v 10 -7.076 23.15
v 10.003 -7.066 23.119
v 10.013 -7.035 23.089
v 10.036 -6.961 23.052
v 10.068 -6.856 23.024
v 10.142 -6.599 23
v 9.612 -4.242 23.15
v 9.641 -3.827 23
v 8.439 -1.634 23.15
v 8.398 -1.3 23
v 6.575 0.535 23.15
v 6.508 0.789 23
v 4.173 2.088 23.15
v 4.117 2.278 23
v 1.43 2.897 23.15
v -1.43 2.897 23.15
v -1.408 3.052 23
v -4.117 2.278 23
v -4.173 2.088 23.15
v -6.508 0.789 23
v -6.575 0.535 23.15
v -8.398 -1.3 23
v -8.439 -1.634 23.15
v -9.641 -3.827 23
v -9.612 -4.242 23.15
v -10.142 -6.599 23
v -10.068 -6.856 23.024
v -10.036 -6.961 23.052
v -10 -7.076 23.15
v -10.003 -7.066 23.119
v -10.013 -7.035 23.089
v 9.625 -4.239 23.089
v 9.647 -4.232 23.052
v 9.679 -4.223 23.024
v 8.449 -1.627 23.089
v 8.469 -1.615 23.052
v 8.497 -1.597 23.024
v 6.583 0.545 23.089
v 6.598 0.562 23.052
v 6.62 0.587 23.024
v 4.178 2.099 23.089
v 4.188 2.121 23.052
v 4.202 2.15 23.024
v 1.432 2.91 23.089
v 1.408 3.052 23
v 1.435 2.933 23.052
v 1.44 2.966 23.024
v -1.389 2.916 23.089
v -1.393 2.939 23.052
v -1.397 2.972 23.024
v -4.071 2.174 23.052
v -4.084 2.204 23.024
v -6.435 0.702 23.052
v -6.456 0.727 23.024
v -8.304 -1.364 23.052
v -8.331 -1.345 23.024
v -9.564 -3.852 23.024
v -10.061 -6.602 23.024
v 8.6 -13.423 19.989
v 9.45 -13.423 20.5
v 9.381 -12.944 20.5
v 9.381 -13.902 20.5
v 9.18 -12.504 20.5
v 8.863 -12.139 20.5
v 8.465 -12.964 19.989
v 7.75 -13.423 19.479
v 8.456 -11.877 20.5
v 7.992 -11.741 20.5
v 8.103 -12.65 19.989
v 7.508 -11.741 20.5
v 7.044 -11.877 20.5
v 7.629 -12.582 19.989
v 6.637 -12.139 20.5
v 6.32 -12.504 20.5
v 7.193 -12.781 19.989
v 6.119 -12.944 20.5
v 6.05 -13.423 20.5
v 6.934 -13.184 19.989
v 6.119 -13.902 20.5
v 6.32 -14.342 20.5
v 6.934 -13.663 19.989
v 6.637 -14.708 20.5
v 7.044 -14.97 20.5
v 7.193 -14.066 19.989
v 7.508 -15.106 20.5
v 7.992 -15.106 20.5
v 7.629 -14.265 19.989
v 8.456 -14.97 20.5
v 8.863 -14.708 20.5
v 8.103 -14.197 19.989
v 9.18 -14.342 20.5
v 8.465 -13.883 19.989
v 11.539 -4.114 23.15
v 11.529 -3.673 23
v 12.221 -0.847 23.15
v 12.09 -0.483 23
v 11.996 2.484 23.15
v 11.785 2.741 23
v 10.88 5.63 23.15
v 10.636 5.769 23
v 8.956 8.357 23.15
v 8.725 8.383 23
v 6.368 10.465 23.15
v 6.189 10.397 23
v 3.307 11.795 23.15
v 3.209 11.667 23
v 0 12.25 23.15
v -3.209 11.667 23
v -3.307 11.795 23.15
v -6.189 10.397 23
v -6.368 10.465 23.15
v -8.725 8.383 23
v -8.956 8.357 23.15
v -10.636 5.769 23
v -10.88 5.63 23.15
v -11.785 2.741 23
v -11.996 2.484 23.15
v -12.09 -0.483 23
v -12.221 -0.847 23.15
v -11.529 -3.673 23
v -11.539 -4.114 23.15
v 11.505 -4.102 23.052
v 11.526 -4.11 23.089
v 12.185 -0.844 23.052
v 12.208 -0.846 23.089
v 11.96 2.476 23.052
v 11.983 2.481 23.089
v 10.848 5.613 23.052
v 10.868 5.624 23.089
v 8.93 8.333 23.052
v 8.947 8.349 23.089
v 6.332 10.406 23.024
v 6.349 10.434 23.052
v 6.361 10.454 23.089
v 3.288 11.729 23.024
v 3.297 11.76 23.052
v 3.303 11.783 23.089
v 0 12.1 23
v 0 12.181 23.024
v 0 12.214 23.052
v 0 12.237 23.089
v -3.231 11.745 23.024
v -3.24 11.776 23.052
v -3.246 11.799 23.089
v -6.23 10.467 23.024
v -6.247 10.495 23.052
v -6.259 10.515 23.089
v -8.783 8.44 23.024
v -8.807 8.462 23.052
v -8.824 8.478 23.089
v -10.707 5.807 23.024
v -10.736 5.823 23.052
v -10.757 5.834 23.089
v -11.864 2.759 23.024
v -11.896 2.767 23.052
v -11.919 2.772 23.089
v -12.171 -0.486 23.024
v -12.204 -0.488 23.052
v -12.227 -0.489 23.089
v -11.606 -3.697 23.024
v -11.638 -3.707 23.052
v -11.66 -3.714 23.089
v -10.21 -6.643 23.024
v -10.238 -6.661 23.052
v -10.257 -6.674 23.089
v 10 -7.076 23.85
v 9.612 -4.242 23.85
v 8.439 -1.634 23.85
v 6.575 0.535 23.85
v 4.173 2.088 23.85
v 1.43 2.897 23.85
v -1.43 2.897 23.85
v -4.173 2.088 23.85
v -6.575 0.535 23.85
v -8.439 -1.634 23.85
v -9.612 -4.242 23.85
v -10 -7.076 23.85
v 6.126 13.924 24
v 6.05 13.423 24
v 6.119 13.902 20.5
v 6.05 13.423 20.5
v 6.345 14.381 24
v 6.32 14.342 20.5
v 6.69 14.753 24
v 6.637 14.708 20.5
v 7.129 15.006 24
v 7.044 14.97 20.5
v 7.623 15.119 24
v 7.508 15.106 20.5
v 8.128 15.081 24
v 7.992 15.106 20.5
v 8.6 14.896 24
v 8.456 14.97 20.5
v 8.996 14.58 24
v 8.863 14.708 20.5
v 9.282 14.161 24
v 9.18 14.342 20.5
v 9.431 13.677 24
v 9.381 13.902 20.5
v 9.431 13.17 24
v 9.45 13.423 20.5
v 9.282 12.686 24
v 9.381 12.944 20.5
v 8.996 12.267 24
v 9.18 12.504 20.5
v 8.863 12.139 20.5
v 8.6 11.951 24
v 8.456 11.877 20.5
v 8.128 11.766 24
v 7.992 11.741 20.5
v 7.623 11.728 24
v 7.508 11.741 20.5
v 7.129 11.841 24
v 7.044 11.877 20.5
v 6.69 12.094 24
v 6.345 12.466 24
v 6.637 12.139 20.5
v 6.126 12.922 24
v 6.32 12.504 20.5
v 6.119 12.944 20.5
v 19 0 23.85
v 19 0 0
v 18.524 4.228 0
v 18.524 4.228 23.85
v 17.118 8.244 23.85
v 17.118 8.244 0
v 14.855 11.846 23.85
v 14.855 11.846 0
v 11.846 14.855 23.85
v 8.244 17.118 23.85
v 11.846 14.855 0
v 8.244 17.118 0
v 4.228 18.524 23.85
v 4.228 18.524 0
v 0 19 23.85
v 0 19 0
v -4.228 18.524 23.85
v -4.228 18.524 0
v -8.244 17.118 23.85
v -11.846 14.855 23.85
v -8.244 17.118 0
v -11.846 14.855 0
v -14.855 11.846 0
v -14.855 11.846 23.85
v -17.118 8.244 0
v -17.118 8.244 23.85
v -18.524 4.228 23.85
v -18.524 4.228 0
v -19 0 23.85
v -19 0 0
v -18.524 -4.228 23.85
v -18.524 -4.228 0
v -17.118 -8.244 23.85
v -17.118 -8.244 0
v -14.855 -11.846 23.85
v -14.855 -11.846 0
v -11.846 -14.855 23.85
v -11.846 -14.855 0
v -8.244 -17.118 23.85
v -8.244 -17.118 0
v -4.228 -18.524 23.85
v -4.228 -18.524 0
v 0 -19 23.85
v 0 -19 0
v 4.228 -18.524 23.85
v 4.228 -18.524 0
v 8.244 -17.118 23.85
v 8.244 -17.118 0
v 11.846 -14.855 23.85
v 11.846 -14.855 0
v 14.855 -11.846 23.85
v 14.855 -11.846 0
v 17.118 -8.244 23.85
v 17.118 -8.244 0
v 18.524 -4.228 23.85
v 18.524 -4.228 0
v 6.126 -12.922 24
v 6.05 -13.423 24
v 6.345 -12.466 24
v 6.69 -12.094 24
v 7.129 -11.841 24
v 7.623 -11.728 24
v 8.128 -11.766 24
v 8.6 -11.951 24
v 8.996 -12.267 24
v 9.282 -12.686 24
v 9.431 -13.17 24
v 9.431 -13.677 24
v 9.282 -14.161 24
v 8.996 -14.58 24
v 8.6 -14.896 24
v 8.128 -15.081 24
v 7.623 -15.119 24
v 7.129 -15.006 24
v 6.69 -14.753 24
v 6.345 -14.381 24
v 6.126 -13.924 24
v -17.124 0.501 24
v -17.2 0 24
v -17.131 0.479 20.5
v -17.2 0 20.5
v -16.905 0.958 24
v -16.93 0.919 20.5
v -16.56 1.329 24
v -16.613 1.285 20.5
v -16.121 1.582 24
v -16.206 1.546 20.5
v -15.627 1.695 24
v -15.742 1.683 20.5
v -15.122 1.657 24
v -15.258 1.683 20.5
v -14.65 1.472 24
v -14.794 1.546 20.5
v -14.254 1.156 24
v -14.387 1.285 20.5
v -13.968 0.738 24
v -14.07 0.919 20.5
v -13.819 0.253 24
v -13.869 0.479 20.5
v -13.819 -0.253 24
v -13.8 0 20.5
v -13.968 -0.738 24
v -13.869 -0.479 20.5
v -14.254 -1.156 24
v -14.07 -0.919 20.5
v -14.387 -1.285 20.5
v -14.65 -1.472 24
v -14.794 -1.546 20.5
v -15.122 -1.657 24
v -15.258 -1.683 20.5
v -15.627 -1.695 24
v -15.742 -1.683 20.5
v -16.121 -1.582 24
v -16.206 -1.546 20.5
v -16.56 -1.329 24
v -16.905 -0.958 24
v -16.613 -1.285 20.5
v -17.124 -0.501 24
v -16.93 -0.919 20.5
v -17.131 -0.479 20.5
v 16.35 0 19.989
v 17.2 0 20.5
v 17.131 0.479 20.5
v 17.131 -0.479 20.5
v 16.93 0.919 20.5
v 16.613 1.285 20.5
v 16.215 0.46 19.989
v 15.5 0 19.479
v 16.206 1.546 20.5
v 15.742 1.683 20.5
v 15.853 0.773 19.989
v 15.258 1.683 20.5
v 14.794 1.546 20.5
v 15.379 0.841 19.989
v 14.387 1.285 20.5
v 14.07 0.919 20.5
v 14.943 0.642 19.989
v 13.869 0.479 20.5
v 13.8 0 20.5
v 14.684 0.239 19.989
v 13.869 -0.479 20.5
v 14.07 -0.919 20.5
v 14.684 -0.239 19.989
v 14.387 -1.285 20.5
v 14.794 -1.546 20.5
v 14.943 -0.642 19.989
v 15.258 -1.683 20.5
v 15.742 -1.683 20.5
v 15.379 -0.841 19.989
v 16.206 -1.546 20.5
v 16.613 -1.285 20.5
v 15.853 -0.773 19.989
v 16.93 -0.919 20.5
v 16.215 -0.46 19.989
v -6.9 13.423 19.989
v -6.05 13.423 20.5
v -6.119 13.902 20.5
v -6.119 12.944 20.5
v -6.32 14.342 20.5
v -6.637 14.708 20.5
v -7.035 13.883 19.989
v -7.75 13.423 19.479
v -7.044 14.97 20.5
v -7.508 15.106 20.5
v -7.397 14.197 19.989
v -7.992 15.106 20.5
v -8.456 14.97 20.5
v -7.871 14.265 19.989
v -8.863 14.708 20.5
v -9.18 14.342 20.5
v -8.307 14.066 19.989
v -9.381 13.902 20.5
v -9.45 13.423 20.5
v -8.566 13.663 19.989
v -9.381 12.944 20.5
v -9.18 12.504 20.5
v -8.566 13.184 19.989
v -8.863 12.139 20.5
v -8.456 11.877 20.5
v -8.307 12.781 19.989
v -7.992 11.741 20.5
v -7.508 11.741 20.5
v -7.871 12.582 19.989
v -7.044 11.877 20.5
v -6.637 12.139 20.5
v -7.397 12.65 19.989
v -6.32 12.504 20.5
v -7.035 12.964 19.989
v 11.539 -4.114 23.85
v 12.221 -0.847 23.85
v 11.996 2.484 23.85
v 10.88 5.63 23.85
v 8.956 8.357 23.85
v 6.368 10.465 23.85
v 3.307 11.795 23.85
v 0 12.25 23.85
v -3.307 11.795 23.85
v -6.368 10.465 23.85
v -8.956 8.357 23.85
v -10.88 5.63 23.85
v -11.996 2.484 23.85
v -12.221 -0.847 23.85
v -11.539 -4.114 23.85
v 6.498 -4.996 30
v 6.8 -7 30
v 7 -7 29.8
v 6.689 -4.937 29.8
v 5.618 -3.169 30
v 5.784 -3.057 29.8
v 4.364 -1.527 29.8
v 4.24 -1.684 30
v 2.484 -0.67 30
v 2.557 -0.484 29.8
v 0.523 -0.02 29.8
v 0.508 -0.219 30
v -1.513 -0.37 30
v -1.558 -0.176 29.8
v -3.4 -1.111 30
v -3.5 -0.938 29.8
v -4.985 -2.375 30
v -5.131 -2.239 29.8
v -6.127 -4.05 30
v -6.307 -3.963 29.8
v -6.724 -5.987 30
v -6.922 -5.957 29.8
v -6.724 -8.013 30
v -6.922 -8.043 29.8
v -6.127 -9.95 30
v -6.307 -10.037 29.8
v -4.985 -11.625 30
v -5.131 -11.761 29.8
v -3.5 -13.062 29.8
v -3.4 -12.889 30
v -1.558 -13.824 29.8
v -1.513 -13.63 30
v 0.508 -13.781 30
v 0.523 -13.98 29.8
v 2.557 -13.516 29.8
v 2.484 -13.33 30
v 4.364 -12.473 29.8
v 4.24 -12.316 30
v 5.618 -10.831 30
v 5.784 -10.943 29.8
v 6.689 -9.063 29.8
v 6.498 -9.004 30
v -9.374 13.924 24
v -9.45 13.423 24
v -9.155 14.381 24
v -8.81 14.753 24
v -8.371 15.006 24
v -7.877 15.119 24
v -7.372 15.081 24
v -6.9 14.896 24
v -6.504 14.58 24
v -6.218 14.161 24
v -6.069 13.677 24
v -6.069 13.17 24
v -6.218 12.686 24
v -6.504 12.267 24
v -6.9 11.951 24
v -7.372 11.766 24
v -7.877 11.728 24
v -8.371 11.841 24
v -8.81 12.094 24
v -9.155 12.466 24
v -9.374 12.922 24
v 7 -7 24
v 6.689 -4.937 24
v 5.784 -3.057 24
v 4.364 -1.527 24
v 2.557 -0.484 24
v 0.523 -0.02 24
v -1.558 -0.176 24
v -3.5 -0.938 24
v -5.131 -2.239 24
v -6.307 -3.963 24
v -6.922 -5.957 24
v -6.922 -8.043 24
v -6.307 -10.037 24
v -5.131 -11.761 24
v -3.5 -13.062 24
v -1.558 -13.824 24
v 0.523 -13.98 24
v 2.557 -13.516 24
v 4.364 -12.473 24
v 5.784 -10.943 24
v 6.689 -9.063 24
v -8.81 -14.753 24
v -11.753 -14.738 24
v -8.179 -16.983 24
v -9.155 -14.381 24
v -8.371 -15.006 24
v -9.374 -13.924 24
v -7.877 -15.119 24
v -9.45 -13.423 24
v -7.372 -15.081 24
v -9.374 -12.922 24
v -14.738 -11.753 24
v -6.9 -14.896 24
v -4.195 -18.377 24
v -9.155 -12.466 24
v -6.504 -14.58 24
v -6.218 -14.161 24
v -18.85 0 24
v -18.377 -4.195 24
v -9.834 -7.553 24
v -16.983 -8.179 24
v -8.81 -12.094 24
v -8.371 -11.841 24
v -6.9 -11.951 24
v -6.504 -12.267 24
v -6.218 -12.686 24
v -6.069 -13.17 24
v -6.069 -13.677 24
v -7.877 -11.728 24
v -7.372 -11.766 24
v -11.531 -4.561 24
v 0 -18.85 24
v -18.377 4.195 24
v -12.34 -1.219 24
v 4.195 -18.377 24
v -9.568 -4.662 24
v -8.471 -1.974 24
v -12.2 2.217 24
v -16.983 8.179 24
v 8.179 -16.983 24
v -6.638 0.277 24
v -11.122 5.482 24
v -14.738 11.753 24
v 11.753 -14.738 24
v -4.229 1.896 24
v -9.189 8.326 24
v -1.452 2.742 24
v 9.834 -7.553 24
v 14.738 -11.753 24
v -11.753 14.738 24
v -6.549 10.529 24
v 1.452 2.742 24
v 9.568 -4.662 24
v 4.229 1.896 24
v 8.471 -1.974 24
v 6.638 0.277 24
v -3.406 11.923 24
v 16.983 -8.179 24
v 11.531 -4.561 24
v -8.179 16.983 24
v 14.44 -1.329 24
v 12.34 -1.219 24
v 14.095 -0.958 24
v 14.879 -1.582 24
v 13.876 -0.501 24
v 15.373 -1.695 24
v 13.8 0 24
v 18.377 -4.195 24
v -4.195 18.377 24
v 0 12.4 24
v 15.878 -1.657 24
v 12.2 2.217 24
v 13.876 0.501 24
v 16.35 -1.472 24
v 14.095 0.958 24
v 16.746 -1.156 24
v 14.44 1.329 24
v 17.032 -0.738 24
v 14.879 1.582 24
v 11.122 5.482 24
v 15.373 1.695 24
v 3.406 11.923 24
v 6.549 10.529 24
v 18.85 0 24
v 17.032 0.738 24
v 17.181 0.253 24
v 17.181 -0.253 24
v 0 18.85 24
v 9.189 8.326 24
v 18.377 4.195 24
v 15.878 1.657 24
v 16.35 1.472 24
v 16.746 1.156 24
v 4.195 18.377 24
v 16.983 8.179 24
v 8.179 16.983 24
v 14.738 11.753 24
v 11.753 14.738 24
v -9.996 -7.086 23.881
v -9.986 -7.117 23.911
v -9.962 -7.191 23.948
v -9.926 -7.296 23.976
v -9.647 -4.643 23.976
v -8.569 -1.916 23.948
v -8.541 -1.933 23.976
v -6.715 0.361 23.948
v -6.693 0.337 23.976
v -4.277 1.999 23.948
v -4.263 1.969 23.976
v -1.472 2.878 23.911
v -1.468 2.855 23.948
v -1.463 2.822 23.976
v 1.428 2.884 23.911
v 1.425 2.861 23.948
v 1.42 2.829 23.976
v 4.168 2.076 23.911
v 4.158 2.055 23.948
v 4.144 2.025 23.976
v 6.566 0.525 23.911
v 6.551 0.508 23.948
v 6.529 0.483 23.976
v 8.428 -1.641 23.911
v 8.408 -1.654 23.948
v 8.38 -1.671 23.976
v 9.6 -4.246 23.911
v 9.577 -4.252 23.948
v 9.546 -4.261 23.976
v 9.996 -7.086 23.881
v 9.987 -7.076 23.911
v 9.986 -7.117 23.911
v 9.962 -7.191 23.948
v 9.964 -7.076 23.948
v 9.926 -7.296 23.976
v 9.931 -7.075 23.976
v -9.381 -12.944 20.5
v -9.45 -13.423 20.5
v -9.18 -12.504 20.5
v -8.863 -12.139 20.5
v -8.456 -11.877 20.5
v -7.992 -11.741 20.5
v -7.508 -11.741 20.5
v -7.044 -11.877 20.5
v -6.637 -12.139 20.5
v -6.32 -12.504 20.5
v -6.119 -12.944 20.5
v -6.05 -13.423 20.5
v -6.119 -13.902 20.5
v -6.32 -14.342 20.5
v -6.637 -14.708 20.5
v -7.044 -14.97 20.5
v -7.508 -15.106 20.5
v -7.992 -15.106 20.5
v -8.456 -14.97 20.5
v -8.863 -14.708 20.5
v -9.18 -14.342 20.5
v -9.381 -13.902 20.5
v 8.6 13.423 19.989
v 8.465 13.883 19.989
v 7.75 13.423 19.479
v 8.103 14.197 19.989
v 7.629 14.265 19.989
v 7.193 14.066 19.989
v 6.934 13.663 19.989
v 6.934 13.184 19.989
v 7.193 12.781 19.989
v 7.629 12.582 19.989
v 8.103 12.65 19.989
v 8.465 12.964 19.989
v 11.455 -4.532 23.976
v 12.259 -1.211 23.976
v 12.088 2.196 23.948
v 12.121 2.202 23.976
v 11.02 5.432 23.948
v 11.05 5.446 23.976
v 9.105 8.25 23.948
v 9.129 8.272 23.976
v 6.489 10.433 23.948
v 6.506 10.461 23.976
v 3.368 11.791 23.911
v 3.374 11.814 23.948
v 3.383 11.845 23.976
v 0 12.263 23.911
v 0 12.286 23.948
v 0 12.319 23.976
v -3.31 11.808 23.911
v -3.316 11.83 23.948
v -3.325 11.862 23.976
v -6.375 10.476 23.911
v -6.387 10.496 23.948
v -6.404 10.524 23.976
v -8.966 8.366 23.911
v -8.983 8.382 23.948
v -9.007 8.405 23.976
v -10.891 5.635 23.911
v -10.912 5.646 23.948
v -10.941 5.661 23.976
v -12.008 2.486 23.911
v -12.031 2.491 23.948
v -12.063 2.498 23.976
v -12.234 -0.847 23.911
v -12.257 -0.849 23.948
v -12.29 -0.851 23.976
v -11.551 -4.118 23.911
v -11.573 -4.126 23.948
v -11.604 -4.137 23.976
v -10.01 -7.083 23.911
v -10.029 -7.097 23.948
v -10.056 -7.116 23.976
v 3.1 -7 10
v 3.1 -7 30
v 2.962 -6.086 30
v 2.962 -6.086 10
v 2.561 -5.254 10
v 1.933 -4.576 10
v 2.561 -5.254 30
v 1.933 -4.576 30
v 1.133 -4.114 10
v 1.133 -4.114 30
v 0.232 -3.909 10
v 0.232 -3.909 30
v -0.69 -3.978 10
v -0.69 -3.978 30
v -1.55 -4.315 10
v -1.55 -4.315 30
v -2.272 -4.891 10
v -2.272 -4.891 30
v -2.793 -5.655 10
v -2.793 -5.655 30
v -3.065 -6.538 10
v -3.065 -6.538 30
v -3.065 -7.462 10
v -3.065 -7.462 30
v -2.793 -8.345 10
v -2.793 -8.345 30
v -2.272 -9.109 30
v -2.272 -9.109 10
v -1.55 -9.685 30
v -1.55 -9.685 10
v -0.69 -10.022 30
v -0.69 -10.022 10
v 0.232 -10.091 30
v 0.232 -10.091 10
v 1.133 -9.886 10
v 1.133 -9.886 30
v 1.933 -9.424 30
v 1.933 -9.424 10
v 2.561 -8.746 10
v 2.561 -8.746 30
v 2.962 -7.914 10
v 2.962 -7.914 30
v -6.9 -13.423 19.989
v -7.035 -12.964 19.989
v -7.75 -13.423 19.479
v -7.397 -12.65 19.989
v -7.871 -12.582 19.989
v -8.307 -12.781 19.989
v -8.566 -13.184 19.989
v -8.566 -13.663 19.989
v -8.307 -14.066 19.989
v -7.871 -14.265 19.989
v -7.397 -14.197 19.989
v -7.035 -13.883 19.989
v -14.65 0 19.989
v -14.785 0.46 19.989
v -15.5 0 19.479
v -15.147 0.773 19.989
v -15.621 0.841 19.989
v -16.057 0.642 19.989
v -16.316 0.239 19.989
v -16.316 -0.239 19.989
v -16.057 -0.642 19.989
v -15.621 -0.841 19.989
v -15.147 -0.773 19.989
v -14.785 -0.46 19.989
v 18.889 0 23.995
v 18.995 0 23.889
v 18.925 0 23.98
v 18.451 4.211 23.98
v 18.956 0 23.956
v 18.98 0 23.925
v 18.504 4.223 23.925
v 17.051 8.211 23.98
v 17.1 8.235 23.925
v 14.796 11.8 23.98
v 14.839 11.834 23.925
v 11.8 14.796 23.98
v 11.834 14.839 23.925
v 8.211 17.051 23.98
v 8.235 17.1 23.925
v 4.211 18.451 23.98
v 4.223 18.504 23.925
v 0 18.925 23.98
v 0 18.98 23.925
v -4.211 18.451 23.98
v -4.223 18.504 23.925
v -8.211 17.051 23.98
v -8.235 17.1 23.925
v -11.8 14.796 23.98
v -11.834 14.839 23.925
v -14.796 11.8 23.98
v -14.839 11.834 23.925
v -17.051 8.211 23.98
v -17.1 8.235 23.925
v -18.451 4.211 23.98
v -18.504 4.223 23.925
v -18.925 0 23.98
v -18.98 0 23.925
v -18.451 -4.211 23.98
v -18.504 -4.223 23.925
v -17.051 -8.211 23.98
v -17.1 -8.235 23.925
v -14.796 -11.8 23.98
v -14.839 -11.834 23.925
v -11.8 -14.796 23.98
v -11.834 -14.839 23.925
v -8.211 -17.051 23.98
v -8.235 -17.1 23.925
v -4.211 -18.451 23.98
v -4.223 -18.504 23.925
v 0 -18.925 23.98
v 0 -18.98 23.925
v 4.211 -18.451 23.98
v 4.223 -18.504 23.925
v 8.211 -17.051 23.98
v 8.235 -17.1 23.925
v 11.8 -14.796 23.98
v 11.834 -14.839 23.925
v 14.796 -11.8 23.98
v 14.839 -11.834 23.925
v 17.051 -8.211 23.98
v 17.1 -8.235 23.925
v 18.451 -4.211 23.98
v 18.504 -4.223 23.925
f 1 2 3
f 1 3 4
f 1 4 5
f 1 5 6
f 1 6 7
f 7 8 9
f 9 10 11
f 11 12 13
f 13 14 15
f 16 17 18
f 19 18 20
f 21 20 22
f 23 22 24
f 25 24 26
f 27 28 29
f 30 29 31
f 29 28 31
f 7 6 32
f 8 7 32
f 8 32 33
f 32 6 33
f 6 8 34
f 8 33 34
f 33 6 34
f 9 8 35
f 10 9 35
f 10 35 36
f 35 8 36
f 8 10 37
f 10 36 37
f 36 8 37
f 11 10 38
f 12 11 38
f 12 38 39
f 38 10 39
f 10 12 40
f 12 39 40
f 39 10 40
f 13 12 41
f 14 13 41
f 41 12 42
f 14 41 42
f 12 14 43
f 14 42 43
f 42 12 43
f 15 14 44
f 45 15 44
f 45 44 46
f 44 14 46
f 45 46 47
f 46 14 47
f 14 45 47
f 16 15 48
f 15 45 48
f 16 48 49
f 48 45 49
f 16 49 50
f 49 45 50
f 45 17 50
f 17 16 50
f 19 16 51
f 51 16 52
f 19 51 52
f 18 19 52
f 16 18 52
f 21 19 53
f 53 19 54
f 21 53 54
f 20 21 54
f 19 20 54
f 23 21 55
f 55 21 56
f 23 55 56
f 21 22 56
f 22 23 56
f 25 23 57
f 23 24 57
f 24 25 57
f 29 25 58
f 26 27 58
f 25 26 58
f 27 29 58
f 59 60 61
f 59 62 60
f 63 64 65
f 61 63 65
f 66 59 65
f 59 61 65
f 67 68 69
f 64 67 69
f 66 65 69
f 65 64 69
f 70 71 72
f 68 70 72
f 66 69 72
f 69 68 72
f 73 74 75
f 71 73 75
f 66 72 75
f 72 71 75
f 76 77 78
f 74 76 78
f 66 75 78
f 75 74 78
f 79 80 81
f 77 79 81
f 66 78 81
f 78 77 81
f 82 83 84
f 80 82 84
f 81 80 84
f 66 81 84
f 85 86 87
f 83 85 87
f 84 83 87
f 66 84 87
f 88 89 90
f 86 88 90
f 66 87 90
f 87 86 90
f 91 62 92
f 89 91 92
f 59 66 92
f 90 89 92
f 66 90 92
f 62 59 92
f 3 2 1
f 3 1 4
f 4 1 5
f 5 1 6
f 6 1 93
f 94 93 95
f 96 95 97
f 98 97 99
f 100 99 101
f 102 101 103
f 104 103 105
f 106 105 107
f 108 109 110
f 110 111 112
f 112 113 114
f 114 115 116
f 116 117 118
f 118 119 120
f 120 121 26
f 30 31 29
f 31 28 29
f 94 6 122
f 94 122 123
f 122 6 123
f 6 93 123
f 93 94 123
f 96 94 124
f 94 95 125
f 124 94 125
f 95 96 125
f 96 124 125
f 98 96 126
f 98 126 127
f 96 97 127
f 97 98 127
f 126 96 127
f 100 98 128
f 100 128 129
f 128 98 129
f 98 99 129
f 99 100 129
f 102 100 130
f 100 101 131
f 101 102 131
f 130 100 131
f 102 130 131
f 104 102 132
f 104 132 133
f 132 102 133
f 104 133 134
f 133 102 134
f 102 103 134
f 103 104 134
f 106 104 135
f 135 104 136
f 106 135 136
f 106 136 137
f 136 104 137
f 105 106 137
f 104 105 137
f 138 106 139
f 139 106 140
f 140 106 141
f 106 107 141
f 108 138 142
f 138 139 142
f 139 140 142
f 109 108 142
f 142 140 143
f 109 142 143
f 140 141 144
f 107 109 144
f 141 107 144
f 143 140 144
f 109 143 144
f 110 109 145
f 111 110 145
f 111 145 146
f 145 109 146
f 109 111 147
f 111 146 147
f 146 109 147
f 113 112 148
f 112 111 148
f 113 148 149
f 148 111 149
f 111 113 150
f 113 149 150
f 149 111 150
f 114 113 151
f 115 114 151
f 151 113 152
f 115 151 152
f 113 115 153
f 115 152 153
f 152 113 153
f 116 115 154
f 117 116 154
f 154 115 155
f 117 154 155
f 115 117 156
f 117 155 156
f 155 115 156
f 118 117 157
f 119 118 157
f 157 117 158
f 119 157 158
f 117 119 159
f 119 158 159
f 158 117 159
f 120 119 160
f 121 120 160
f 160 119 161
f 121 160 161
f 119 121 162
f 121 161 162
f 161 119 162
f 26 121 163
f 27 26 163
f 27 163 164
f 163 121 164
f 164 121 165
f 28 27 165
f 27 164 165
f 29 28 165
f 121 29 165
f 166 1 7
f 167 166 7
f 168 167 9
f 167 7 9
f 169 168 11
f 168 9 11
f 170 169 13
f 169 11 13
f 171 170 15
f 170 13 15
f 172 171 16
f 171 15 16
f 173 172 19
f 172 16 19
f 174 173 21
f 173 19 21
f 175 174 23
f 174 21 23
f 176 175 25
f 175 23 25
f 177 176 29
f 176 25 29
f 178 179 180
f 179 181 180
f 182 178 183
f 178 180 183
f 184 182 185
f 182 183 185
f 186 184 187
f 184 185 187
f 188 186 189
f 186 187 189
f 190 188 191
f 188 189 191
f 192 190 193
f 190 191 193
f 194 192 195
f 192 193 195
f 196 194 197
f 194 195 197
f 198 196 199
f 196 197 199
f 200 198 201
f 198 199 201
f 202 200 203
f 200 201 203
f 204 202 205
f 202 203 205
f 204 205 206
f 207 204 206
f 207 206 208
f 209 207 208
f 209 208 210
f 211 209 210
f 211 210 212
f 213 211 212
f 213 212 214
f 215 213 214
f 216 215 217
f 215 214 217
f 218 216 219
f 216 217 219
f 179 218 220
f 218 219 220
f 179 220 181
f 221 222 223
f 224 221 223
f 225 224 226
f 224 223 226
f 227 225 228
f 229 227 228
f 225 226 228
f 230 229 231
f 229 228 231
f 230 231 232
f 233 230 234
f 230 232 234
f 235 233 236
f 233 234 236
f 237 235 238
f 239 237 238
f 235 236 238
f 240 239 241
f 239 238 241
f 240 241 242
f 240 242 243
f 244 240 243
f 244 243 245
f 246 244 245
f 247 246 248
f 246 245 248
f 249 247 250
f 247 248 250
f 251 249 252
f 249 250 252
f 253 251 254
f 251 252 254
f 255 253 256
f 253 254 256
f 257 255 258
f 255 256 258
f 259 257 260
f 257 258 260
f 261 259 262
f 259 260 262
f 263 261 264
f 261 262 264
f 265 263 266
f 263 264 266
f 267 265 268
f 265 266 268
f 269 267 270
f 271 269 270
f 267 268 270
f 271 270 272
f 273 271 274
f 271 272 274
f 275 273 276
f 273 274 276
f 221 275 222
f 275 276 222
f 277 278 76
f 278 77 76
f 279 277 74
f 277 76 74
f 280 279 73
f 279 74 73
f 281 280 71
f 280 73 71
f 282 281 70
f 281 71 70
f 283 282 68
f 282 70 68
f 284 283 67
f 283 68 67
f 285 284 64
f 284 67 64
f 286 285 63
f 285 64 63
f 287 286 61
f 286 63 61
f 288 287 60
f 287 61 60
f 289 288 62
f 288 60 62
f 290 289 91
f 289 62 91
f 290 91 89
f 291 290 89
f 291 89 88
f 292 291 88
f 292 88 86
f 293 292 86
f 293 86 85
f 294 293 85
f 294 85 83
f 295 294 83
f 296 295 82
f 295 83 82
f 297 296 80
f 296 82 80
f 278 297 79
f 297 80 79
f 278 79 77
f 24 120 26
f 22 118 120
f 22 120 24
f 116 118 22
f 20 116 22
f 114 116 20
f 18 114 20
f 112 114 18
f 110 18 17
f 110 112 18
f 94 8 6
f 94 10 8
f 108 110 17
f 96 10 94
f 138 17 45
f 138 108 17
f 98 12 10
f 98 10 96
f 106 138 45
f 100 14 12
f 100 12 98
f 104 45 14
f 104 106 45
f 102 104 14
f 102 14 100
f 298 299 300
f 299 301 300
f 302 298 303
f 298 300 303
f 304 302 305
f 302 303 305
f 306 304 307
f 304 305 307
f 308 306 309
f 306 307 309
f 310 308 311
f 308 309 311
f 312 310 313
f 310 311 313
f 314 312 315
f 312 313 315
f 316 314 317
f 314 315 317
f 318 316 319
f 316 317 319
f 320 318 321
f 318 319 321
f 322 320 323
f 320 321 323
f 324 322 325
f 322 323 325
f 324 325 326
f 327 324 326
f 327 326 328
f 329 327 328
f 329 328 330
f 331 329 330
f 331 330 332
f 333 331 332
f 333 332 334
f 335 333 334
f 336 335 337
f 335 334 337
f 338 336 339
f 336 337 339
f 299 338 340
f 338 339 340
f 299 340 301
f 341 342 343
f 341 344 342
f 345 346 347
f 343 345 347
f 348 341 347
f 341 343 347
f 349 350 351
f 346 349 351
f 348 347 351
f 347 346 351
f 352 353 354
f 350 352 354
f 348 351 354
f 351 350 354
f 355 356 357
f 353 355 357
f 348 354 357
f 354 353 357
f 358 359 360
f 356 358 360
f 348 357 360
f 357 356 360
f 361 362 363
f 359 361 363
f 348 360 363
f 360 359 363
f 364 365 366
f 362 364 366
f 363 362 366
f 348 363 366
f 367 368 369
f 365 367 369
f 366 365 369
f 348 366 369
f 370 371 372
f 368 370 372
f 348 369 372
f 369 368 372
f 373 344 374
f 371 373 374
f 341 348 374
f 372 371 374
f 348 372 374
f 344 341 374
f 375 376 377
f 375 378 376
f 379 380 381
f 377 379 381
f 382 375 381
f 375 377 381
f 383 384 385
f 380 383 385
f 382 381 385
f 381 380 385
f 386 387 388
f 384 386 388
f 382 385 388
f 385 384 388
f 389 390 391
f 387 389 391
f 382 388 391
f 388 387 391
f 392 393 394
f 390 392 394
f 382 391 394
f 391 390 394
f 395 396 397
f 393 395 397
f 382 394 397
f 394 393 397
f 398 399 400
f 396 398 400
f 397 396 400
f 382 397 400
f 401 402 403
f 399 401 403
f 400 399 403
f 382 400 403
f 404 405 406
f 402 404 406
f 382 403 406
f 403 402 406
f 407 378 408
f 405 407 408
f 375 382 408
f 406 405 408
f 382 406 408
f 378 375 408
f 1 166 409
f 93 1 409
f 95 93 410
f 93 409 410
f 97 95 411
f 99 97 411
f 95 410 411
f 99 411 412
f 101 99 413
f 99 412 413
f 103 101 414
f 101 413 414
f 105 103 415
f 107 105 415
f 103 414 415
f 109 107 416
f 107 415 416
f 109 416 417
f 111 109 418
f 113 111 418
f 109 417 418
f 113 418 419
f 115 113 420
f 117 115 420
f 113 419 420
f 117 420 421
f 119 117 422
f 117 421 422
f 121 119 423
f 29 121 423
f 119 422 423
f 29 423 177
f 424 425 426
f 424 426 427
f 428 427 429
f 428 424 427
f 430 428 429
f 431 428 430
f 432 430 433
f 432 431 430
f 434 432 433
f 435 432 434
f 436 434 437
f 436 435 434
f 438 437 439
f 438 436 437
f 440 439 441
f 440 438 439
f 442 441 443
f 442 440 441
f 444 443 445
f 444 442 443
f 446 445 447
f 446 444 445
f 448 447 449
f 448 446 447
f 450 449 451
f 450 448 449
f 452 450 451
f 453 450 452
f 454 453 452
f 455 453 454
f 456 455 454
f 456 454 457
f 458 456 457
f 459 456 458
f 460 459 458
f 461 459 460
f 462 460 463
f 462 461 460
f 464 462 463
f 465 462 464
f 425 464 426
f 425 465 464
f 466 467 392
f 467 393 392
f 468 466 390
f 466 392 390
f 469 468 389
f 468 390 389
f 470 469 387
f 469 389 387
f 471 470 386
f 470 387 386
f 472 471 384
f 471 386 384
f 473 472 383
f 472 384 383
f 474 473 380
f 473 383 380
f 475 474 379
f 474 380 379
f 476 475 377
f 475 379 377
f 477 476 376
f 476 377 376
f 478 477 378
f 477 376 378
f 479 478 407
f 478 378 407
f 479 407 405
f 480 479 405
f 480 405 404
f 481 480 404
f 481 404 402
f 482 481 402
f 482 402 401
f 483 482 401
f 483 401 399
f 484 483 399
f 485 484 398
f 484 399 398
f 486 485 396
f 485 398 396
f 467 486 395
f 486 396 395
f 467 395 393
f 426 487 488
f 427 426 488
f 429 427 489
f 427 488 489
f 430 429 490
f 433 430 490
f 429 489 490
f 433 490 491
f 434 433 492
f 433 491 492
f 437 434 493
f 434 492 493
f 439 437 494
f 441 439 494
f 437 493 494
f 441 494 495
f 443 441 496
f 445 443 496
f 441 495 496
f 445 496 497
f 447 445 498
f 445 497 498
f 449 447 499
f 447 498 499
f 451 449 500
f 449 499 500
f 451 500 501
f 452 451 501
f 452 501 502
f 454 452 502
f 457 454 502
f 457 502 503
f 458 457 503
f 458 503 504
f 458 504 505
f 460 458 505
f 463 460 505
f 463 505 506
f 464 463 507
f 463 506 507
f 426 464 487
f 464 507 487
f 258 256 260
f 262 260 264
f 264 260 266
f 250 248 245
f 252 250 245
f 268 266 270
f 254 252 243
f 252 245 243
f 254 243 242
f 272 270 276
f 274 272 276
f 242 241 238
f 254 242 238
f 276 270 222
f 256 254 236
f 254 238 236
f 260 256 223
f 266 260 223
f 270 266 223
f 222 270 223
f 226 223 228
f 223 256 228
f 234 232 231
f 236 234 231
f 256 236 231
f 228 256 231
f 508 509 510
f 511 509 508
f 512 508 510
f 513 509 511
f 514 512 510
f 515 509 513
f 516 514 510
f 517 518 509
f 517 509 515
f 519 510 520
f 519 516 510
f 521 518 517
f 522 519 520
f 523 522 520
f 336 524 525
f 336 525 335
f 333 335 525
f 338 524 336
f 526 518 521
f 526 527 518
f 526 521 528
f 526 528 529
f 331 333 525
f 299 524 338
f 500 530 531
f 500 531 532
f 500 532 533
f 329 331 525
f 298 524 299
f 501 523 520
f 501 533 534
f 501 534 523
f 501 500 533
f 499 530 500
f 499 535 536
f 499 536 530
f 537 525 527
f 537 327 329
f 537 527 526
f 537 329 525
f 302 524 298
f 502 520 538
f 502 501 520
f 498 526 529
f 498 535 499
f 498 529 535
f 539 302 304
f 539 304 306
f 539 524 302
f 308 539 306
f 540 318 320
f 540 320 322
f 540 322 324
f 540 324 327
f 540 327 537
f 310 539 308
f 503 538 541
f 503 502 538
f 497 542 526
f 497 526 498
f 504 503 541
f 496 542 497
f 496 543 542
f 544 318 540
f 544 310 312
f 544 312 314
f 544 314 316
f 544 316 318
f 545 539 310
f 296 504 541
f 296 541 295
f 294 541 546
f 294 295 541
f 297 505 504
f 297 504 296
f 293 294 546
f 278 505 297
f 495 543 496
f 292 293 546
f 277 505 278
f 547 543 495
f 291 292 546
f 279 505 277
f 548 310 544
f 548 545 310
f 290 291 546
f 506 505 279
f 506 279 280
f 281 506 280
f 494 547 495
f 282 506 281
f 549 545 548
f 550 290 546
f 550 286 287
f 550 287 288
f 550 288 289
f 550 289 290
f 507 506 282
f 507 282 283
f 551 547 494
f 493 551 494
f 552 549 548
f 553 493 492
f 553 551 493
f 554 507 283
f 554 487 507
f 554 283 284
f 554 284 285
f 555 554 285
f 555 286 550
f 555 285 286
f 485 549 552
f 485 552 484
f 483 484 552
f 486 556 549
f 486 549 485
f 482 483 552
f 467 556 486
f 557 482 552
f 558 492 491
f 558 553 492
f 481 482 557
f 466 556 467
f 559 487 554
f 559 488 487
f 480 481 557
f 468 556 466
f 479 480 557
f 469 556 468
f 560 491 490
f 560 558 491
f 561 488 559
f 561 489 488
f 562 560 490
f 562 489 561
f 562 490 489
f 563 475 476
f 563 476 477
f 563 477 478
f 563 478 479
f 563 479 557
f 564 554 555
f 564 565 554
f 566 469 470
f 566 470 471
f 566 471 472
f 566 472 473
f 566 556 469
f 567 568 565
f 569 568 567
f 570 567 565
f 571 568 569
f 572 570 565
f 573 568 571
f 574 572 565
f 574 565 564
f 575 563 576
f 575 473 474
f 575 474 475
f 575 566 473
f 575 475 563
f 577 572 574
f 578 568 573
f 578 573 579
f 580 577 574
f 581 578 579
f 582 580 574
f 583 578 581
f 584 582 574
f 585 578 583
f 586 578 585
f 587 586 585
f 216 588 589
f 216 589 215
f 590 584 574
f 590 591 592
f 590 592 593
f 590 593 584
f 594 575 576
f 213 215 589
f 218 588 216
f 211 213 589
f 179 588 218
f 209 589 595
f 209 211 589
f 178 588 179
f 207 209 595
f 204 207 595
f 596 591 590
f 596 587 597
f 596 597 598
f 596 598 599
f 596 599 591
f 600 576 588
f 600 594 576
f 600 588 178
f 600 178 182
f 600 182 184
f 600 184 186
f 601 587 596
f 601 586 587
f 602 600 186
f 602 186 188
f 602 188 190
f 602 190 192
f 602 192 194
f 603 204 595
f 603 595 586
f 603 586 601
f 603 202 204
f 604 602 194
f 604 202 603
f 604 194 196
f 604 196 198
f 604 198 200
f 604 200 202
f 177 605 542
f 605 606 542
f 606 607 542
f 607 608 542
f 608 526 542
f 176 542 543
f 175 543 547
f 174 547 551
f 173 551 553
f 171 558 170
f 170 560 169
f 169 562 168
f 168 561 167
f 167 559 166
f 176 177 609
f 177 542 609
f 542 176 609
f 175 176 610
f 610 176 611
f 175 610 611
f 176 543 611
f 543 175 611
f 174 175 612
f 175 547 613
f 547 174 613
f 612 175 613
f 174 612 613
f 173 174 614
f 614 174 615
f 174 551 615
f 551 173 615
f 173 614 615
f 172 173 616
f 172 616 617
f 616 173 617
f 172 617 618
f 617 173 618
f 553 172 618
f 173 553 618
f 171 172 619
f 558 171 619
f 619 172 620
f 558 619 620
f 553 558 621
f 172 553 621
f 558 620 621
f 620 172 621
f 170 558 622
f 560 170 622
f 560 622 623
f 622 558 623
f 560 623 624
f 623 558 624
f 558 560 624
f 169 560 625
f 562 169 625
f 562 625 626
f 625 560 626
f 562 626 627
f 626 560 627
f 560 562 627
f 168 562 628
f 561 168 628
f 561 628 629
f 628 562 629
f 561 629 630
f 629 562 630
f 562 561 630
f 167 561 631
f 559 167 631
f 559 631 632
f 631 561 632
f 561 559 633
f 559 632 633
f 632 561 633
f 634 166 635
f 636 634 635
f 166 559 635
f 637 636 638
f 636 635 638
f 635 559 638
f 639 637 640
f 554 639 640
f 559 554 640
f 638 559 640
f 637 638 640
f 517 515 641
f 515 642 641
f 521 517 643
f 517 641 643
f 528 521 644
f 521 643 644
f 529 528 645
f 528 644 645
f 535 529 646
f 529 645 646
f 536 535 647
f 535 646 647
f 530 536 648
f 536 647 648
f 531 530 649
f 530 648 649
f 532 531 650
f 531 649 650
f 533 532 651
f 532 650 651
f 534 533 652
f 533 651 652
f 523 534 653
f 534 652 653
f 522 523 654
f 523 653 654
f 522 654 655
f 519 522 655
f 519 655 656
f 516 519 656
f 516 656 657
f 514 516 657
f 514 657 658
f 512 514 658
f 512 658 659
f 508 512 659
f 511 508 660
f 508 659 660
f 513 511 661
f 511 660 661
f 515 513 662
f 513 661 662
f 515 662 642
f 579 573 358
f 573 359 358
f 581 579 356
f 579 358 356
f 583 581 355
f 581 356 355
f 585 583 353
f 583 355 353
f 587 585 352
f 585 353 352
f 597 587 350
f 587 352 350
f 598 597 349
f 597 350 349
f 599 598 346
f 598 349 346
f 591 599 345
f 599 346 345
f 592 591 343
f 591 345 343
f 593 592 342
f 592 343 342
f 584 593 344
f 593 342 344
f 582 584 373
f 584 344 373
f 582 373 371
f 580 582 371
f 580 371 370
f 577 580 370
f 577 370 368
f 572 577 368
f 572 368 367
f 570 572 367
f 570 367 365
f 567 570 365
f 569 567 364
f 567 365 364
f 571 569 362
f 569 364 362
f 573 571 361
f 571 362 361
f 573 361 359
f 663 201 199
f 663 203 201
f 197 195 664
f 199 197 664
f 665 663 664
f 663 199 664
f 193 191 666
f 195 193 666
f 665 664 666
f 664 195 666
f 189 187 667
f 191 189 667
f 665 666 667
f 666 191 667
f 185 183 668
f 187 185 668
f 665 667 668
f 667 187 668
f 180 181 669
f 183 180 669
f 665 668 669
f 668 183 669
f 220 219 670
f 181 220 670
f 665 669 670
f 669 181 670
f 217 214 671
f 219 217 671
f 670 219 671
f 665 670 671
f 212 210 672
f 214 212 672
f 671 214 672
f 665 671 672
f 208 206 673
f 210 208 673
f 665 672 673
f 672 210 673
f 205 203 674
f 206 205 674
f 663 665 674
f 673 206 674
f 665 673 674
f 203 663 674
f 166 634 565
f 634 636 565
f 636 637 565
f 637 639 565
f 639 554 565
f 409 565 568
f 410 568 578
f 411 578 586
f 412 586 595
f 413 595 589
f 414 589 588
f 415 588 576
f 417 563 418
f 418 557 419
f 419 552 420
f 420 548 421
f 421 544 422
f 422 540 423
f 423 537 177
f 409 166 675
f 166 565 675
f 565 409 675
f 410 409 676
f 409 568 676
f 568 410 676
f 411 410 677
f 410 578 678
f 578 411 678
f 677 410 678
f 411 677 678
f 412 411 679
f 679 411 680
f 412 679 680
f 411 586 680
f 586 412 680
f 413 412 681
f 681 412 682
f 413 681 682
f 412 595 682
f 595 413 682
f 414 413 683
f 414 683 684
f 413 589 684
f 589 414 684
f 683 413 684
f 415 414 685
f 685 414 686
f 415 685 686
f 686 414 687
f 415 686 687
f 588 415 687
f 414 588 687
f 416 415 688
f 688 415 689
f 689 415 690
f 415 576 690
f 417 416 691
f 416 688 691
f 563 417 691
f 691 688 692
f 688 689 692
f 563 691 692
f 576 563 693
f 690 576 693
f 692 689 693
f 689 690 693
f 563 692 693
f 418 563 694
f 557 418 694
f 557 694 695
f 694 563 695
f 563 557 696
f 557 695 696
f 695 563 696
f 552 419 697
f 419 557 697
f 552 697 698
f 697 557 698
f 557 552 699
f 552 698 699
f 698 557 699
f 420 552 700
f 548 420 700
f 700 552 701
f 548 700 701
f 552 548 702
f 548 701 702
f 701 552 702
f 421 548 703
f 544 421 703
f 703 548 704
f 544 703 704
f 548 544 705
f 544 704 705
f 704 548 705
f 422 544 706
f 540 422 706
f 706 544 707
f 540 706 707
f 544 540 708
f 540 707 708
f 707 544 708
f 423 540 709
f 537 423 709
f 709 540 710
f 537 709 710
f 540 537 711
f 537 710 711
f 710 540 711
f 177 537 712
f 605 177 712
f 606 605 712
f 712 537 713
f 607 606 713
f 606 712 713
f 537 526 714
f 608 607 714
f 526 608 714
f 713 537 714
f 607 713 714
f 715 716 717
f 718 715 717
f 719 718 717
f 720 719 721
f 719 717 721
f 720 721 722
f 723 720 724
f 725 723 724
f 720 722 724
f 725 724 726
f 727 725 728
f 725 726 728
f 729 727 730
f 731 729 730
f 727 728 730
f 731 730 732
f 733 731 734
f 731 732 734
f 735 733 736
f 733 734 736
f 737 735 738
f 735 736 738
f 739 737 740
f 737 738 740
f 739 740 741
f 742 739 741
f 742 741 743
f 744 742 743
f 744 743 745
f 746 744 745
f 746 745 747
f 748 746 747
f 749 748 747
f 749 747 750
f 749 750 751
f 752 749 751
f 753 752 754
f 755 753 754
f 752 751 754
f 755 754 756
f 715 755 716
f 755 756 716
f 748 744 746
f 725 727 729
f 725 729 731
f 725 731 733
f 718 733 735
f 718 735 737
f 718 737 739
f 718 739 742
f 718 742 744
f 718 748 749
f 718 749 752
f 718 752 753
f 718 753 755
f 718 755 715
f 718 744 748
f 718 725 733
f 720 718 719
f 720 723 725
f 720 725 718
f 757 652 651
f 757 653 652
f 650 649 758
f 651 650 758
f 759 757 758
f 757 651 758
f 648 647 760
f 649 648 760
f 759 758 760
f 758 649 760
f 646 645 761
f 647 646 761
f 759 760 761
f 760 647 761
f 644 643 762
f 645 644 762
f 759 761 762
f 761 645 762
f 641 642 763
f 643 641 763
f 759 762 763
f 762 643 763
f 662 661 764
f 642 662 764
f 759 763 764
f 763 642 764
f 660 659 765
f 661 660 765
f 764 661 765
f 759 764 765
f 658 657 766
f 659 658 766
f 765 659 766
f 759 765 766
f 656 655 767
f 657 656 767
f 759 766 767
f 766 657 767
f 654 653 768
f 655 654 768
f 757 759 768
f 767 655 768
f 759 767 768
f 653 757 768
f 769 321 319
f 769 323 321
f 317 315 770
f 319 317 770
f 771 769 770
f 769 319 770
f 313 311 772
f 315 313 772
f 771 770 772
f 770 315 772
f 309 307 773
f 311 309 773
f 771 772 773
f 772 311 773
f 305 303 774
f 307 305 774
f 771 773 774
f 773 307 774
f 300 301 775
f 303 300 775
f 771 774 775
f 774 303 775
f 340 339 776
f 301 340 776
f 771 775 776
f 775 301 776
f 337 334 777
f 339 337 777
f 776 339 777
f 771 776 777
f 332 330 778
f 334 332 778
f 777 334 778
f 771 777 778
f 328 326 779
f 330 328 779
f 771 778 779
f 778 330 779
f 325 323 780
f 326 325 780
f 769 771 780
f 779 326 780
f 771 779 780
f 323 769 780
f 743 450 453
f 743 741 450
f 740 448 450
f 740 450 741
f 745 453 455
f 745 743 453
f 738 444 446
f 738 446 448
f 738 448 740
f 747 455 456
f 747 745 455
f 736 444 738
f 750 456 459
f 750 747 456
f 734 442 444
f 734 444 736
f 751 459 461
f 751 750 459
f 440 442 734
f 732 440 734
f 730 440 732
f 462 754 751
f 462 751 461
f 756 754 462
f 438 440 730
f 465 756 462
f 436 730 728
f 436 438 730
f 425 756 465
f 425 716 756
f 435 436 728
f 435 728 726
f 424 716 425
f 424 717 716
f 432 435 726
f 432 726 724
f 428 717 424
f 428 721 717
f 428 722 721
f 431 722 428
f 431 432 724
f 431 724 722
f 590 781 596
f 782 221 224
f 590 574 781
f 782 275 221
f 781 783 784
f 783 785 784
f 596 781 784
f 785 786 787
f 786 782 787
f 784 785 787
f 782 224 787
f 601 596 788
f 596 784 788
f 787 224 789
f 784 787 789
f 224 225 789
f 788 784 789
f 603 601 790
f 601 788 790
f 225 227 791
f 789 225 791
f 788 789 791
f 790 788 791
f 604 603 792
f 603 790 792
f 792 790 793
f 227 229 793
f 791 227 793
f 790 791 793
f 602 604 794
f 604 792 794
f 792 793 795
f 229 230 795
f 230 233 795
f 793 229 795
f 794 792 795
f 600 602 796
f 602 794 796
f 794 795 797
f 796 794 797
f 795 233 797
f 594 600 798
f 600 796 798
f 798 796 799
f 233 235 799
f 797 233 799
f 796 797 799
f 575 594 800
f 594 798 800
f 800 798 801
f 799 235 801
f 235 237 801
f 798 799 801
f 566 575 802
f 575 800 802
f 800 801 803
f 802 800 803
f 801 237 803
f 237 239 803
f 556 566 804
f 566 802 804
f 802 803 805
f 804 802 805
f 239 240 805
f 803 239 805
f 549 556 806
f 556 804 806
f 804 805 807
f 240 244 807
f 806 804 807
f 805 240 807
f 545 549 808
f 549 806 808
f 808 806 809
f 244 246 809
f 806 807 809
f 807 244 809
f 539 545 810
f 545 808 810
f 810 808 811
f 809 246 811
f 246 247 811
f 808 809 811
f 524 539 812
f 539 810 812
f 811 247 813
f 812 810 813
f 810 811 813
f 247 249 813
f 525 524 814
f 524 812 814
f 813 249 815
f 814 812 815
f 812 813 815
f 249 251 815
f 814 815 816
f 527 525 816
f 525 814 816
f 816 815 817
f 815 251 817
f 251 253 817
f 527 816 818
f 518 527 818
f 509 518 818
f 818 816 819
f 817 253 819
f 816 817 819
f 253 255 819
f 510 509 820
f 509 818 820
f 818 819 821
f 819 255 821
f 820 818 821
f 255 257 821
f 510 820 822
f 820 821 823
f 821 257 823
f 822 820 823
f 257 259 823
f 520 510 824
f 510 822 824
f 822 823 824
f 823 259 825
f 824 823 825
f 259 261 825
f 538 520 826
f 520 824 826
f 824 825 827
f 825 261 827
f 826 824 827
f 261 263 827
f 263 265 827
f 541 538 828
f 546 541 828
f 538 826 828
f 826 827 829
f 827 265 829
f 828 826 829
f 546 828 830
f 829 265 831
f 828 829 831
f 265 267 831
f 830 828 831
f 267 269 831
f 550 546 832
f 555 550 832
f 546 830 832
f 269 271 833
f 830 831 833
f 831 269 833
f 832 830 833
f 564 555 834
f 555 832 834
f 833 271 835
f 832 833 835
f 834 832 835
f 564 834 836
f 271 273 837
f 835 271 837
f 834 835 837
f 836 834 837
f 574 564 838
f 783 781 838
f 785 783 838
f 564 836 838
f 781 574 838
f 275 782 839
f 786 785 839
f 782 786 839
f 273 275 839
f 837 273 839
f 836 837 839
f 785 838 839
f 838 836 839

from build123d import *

# Parameters (mm, degrees)
SKETCH1_R                = 19
BOSS_EXTRUDE1_DEPTH      = 24
SKETCH3_R                = 12.25
CUT_EXTRUDE1_DEPTH       = 1
SKETCH4_R                = 10
BOSS_EXTRUDE4_DEPTH      = 1
SKETCH9_R                = 7
BOSS_EXTRUDE5_DEPTH      = 6
SKETCH10_R               = 3.1
CUT_EXTRUDE2_DEPTH       = 20
M3_CLEARANCE_HOLE1_D     = 3.4
M3_CLEARANCE_HOLE1_DEPTH = 3.5
M3_CLEARANCE_HOLE1_TIP   = 1.021463052
FILLET1_R                = 0.15
CHAMFER1_SIZE            = 0.2


with BuildPart() as part:
    # Sketch1 → Boss-Extrude1 (new body)
    with BuildSketch(Plane.XY):
        Circle(SKETCH1_R)
    extrude(amount=BOSS_EXTRUDE1_DEPTH)

    # Sketch3 → Cut-Extrude1 (cut)
    with BuildSketch(Plane.XY.offset(24)):
        Circle(SKETCH3_R)
    extrude(amount=-CUT_EXTRUDE1_DEPTH, mode=Mode.SUBTRACT)

    # Sketch4 → Boss-Extrude4 (add)
    with BuildSketch(Plane.XY.offset(23)):
        with Locations((0, -7)):
            Circle(SKETCH4_R)
    extrude(amount=BOSS_EXTRUDE4_DEPTH)

    # Sketch9 → Boss-Extrude5 (add)
    with BuildSketch(Plane.XY.offset(24)):
        with Locations((0, -7)):
            Circle(SKETCH9_R)
    extrude(amount=BOSS_EXTRUDE5_DEPTH)

    # Sketch10 → Cut-Extrude2 (cut)
    with BuildSketch(Plane.XY.offset(30)):
        with Locations((0, -7)):
            Circle(SKETCH10_R)
    extrude(amount=-CUT_EXTRUDE2_DEPTH, mode=Mode.SUBTRACT)

    # M3 Clearance Hole1
    with Locations(Plane.XY.offset(24)):
        with Locations((15.5, 0), (-15.5, 0), (-7.75, 13.423393759), (7.75, 13.423393759), (-7.75, -13.423393759), (7.75, -13.423393759)):
            Hole(M3_CLEARANCE_HOLE1_D / 2, depth=M3_CLEARANCE_HOLE1_DEPTH)
            with Locations((0, 0, -(M3_CLEARANCE_HOLE1_DEPTH + M3_CLEARANCE_HOLE1_TIP / 2))):  # 118° drill point
                Cone(0, M3_CLEARANCE_HOLE1_D / 2, M3_CLEARANCE_HOLE1_TIP, mode=Mode.SUBTRACT)

    # Fillet1
    fillet1_edges = [part.edges().sort_by_distance(p)[0] for p in [
        (0, 3, 23),
        (0, 12.25, 24),
        (0, 3, 24),
        (-19, 0, 24),
        (0, 12.25, 23),
    ]]
    fillet(fillet1_edges, radius=FILLET1_R)

    # Chamfer1
    chamfer1_edges = [part.edges().sort_by_distance(p)[0] for p in [
        (-7, -7, 30),
    ]]
    chamfer(chamfer1_edges, length=CHAMFER1_SIZE)


solid = part.part
